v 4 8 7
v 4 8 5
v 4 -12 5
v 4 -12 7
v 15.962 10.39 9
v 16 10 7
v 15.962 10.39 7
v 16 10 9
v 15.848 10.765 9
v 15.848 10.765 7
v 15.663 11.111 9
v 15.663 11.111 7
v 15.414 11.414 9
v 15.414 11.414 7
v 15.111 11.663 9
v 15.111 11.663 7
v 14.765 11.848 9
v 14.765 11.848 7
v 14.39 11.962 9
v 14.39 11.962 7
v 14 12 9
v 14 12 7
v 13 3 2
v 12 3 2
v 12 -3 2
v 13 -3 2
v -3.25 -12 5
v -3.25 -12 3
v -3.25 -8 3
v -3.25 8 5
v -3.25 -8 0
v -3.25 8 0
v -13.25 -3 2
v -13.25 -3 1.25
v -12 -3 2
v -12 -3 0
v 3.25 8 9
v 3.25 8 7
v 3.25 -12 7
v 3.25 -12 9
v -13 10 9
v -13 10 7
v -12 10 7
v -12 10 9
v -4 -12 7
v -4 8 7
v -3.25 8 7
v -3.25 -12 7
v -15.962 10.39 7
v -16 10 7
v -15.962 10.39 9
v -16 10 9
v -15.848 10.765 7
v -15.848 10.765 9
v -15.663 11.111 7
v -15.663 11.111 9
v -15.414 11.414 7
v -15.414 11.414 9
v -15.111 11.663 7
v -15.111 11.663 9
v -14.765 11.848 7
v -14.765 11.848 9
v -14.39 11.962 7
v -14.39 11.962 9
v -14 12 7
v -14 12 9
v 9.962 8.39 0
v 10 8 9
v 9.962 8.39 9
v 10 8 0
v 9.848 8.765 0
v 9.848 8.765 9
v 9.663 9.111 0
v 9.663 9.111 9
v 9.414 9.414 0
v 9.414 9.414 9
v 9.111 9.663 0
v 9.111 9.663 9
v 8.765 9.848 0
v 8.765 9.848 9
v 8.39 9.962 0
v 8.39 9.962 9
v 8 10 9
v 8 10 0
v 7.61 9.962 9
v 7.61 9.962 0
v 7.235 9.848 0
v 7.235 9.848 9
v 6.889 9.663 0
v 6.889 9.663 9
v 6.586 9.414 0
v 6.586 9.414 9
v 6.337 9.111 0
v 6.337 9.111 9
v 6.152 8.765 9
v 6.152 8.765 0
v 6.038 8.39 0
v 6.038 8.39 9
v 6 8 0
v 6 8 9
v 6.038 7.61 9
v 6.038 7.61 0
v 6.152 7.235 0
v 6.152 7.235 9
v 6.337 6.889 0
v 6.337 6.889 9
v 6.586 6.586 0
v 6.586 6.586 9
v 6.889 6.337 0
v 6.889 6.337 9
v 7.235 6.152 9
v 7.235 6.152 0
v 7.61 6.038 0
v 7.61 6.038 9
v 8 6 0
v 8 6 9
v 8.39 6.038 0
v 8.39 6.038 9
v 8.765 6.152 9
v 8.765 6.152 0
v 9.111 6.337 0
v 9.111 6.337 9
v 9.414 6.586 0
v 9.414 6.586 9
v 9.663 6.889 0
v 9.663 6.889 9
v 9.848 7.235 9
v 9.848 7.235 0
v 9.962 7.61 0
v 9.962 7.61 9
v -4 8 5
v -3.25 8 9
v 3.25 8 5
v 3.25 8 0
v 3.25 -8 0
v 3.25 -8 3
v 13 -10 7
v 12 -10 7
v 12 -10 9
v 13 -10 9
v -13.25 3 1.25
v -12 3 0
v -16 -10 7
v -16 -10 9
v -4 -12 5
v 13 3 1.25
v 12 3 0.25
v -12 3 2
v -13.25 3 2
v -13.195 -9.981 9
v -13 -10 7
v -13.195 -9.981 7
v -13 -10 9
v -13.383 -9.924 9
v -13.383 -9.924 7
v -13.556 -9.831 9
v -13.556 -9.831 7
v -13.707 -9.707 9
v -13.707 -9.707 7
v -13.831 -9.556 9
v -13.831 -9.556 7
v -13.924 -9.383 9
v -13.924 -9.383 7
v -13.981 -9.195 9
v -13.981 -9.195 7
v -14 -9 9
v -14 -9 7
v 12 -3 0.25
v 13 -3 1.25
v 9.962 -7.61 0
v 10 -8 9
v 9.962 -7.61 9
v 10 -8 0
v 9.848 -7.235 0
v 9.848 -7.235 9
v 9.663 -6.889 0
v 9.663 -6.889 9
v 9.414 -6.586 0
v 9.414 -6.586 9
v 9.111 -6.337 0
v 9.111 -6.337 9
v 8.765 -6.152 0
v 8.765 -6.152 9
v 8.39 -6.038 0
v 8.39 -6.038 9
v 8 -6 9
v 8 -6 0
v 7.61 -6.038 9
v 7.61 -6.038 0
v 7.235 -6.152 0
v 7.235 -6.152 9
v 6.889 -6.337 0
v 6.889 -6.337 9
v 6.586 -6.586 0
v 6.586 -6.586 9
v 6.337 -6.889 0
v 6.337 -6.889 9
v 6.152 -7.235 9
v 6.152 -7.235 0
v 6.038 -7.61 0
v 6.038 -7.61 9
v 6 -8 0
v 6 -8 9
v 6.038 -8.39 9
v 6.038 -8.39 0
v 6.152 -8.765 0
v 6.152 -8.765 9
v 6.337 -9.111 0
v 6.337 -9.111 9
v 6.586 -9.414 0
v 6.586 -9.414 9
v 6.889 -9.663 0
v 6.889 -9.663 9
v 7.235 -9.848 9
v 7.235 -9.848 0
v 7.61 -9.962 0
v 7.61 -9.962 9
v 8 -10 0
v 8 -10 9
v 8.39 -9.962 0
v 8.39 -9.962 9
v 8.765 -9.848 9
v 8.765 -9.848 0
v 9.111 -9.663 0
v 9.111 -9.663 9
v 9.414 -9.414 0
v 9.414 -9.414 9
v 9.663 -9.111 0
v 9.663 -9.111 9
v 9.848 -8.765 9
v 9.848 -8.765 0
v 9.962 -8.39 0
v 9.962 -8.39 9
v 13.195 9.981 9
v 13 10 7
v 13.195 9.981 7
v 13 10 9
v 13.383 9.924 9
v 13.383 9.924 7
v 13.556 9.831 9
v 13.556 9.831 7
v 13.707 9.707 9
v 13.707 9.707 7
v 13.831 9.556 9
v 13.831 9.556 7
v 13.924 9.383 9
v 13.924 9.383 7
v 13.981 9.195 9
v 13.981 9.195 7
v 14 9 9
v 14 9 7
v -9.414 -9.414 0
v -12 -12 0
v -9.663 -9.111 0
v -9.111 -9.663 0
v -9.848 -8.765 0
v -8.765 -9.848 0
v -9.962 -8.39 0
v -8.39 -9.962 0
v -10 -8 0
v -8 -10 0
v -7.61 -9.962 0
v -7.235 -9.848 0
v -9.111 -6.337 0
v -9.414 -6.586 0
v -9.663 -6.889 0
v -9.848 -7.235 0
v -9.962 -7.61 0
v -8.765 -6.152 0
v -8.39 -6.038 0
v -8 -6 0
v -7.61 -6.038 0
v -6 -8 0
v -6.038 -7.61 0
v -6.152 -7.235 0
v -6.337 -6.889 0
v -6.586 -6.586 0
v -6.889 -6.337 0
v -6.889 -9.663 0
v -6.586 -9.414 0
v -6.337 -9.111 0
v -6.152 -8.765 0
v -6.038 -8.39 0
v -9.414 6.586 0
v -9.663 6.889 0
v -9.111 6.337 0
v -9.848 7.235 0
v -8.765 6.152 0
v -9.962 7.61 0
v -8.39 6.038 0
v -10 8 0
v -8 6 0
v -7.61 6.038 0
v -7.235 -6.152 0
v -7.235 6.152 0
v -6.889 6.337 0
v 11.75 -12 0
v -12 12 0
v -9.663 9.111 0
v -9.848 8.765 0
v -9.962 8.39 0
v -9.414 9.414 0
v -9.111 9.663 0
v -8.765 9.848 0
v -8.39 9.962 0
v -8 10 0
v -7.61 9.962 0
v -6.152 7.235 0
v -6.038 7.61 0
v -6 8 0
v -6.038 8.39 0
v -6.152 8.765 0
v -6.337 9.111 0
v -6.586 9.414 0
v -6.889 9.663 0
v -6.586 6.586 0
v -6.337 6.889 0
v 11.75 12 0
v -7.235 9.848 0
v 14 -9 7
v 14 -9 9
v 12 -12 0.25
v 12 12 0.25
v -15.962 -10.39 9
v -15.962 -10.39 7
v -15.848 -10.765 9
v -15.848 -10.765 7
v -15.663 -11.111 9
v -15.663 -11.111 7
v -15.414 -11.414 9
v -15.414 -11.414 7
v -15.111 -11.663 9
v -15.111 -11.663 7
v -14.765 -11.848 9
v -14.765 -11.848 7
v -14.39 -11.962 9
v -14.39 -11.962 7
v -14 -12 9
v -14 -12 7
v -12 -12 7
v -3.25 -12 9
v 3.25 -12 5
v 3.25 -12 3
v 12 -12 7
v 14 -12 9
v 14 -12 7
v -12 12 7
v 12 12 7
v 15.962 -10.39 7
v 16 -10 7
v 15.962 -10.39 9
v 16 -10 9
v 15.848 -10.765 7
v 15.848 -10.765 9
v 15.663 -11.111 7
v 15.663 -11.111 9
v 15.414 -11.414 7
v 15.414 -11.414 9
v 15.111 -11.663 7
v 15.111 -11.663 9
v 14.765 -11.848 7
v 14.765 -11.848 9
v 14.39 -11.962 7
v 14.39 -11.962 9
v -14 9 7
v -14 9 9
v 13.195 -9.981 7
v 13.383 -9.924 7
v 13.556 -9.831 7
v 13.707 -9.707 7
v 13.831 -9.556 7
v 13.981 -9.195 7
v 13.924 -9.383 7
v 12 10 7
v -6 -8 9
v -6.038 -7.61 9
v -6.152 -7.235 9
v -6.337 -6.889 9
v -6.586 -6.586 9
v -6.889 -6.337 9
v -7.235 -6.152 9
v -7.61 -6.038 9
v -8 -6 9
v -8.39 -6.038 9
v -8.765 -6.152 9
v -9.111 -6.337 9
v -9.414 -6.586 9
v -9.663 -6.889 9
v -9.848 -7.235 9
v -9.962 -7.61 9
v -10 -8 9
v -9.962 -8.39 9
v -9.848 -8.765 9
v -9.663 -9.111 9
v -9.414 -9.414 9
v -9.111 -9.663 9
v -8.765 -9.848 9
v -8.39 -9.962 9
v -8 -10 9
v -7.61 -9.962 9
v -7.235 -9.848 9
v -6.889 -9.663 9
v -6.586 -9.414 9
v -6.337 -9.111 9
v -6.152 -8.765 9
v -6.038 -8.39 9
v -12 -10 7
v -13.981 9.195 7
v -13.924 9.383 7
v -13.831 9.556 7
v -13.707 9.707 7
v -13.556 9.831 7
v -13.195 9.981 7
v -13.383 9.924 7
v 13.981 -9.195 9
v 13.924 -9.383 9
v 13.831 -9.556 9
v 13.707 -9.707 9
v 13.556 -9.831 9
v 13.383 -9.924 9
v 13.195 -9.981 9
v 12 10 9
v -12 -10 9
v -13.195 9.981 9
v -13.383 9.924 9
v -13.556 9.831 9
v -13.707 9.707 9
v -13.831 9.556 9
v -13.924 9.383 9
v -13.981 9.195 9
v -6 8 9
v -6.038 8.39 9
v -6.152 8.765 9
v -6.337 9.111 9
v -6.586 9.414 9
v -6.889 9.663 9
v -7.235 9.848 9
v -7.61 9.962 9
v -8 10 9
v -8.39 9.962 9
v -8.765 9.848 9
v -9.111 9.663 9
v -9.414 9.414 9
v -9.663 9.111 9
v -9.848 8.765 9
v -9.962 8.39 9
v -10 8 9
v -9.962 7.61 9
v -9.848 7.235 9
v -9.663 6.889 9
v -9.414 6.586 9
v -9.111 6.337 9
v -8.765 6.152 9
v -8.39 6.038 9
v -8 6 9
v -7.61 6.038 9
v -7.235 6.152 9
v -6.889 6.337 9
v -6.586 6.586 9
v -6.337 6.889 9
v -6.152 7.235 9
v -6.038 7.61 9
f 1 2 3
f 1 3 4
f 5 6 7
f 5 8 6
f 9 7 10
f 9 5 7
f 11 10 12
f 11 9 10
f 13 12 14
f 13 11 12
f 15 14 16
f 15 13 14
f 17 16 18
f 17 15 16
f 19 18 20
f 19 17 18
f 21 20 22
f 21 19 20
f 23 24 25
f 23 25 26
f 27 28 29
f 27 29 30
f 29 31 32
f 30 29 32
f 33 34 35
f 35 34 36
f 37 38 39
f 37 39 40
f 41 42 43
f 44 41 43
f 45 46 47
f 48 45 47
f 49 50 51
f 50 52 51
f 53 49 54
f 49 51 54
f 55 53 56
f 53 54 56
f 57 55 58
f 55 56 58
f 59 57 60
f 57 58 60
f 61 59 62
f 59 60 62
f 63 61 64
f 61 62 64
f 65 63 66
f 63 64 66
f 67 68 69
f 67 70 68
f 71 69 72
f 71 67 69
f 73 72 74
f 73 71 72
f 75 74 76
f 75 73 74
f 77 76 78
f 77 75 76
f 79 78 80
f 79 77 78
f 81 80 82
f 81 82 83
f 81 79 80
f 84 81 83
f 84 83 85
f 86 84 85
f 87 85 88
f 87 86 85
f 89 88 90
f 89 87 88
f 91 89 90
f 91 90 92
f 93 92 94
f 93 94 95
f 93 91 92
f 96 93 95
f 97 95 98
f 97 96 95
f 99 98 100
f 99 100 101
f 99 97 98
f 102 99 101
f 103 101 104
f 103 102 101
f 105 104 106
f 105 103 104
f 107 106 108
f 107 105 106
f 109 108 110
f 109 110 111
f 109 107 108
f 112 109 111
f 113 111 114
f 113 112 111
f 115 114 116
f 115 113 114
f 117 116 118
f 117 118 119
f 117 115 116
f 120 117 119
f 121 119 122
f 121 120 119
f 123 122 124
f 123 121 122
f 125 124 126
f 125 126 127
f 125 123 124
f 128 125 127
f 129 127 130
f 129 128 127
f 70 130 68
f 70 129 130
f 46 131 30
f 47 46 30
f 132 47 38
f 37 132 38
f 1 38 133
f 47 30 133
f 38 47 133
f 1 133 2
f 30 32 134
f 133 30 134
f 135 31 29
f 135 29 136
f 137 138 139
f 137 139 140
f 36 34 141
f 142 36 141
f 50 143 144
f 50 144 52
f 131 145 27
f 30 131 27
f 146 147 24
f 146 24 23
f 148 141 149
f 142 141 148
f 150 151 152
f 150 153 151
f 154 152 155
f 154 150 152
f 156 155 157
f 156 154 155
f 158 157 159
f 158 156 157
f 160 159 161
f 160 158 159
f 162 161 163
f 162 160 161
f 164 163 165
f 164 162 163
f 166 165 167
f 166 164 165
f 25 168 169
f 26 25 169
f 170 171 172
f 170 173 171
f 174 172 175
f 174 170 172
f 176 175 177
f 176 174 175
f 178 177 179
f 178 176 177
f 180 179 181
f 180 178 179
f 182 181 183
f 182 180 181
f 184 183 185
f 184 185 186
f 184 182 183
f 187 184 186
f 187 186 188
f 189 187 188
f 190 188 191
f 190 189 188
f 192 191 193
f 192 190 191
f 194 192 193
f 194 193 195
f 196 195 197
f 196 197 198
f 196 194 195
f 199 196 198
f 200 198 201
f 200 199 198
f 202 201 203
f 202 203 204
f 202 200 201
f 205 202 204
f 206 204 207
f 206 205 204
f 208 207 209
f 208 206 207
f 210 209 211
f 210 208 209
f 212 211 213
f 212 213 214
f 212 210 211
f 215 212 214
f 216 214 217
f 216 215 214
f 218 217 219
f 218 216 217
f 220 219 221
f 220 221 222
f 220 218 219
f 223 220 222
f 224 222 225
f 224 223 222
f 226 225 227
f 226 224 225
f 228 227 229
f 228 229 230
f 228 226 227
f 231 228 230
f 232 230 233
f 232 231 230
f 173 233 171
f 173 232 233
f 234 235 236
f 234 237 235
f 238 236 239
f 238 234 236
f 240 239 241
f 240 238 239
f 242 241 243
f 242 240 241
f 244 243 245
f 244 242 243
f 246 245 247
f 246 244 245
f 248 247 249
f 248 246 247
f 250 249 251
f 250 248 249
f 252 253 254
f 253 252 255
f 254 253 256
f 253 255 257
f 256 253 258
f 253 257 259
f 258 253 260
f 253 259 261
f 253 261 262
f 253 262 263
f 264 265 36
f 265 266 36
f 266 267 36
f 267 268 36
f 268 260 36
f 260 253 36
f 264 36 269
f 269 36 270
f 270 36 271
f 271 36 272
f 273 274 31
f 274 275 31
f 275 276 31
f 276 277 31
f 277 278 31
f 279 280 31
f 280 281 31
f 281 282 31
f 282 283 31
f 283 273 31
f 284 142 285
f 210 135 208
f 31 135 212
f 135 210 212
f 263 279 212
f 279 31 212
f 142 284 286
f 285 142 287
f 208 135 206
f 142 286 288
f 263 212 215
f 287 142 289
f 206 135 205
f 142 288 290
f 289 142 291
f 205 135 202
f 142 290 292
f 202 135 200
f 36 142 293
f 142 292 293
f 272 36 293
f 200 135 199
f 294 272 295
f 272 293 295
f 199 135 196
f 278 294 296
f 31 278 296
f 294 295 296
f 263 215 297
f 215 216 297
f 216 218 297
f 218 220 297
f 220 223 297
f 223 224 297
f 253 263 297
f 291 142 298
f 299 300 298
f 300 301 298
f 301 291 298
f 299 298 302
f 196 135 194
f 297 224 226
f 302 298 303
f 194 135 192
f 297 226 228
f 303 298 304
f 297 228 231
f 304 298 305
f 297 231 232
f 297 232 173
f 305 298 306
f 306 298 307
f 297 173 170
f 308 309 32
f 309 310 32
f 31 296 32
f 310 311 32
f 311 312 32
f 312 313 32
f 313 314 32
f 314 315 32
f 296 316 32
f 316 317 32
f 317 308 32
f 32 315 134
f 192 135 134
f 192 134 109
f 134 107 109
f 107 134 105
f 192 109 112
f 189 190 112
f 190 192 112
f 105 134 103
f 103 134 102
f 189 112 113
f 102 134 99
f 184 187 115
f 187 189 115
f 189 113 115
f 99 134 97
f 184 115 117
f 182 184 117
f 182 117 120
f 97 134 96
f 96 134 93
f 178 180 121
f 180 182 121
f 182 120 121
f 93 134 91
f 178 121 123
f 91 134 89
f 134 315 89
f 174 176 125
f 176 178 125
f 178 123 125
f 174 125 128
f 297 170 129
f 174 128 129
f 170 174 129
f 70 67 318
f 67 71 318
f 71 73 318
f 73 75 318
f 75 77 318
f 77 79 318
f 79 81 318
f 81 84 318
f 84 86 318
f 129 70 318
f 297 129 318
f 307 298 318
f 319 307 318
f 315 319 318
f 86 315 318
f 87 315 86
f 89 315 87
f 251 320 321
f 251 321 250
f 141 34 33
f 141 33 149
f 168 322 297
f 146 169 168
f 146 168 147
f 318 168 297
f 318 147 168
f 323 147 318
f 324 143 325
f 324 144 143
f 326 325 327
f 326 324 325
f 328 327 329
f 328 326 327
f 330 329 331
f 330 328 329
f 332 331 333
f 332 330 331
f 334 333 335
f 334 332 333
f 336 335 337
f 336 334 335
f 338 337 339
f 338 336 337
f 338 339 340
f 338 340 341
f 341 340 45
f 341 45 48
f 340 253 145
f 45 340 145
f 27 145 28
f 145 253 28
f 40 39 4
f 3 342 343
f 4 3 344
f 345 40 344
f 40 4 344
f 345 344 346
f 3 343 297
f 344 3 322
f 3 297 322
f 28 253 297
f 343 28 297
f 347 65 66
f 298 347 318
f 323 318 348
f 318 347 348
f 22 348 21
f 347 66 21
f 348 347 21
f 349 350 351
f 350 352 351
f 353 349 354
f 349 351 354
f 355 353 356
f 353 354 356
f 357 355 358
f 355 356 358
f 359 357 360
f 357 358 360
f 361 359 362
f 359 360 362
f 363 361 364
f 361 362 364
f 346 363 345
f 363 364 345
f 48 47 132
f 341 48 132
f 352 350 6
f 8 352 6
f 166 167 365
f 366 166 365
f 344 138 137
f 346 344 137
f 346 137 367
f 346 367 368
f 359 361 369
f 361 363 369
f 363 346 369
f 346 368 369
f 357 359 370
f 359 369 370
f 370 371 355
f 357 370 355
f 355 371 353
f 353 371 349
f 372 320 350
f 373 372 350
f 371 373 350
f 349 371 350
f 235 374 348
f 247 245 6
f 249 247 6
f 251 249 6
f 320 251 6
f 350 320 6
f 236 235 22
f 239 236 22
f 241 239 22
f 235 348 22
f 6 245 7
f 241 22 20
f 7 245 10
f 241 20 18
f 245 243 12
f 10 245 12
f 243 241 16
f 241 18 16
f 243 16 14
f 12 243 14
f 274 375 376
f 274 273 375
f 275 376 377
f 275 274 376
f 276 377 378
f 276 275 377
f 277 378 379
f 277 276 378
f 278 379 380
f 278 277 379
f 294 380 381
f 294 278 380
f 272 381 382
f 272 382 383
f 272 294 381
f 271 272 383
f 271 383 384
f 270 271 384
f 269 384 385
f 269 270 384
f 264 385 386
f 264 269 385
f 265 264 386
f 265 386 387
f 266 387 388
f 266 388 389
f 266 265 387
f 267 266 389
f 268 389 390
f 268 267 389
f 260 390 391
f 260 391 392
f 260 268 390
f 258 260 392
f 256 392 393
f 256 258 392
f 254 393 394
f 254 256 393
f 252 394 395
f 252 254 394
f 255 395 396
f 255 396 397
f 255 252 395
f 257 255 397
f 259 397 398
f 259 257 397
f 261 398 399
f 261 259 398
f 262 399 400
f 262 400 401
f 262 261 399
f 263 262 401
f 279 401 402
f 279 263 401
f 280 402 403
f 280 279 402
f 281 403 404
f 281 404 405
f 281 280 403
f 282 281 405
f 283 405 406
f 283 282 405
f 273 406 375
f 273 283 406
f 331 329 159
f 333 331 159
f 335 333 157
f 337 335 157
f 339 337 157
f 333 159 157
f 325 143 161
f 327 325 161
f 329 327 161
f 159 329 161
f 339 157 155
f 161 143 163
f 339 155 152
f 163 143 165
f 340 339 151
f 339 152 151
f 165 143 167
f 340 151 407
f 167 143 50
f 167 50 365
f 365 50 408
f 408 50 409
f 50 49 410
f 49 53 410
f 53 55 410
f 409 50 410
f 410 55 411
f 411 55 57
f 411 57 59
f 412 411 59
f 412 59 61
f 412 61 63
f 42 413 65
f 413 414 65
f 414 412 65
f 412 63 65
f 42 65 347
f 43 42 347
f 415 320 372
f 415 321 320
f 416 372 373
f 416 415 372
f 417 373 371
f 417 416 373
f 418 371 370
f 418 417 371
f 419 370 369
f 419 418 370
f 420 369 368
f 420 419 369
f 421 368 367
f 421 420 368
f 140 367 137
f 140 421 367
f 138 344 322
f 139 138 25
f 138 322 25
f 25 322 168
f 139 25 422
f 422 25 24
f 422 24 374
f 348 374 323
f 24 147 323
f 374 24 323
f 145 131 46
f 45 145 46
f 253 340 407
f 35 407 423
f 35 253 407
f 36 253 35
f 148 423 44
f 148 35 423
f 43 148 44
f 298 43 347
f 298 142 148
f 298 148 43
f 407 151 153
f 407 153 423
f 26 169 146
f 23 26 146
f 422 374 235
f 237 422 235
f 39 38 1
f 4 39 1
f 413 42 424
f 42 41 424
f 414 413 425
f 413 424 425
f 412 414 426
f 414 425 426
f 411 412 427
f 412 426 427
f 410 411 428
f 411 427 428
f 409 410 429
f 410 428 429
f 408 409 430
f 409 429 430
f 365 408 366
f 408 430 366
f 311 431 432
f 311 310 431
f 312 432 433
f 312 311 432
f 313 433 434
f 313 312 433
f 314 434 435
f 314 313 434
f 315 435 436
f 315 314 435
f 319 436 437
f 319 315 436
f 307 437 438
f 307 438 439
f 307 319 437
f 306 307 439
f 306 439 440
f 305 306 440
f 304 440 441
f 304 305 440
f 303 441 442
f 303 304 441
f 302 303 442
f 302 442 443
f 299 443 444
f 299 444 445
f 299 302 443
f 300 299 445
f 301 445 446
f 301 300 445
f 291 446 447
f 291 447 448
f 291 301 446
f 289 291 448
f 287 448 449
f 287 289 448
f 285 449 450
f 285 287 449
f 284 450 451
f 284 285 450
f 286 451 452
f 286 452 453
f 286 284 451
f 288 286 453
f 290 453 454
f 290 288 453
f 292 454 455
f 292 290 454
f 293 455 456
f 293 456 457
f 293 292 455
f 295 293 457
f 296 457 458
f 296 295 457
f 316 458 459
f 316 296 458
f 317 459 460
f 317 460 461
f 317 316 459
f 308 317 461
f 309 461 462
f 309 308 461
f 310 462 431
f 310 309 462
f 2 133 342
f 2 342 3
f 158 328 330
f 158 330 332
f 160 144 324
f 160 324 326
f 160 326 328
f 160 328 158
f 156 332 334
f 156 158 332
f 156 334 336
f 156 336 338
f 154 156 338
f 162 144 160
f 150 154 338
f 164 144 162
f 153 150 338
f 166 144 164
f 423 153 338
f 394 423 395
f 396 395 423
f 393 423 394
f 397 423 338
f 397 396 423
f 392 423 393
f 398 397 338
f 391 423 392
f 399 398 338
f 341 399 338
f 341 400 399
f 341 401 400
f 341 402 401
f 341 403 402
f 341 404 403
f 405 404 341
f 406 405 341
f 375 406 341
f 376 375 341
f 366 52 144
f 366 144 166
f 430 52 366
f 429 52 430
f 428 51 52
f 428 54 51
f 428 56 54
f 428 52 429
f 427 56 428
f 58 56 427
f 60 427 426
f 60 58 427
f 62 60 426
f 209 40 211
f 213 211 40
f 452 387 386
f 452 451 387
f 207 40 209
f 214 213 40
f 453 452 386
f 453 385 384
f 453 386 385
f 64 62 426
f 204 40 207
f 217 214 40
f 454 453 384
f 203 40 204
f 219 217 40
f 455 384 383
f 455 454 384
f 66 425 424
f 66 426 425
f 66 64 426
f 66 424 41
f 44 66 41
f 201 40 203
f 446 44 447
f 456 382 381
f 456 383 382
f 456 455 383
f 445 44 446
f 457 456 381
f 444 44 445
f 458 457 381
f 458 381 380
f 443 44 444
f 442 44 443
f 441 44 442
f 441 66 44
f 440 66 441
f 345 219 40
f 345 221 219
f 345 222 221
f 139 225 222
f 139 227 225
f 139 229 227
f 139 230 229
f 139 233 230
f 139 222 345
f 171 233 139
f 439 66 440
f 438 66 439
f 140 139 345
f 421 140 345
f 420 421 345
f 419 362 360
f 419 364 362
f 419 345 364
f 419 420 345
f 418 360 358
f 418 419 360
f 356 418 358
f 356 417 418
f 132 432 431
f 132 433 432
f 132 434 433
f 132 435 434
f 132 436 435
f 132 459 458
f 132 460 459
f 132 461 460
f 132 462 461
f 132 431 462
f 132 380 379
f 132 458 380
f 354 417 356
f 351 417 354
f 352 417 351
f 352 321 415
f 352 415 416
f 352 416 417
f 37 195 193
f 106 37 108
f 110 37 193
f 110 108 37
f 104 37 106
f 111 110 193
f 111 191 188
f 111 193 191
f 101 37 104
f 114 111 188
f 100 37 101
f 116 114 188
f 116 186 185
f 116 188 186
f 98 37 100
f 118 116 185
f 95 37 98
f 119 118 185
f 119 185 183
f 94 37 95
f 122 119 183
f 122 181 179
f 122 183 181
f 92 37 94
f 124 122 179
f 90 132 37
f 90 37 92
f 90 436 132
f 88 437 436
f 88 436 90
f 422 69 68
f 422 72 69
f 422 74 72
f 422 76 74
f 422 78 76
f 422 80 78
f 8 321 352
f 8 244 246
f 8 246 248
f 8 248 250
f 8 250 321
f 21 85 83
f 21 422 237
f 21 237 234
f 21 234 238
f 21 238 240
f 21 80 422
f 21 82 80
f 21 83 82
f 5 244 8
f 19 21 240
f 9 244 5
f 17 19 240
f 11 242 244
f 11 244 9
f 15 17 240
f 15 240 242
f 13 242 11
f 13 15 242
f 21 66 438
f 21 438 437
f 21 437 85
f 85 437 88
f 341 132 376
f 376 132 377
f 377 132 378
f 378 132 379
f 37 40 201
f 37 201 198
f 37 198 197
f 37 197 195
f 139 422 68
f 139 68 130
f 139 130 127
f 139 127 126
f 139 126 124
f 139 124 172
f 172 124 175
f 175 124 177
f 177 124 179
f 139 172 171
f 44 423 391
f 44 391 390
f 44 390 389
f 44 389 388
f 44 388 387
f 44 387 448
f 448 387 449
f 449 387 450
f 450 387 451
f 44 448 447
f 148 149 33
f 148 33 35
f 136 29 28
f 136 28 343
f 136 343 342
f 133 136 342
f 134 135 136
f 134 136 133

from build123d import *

# Parameters (mm, degrees)
F0_W      = 24
F0_H      = 24
F0_R      = 2
F1_DEPTH  = 9
F3_START  = 7
F2_W      = 32
F2_H      = 24
F2_R      = 2
F2_W_2    = 2
F2_H_2    = 20
F3_DEPTH  = 2
F4_W      = 8
F4_H      = 6
F5_DEPTH  = 12
F6_DEPTH  = 8
F7_W      = 0.75
F7_H      = 2
F8_DEPTH  = 12
F9_W      = 1.25
F9_H      = 6
F10_DEPTH = 2
F11_SIZE  = 1.25
F12_W     = 6.5
F12_H     = 16
F13_DEPTH = 3
F14_R     = 2
F15_R     = 1


with BuildPart() as f1:
    # F0 (on Top) → F1 (new body)
    with BuildSketch(Plane.XY):
        Rectangle(F0_W, F0_H)
        with Locations((-8, -8)):
            Circle(F0_R, mode=Mode.SUBTRACT)
        with Locations((8, -8)):
            Circle(F0_R, mode=Mode.SUBTRACT)
        with Locations((-8, 8)):
            Circle(F0_R, mode=Mode.SUBTRACT)
        with Locations((8, 8)):
            Circle(F0_R, mode=Mode.SUBTRACT)
    extrude(amount=F1_DEPTH)

    # F2 (on Top) → F3 (join)
    with BuildSketch(Plane.XY.offset(F3_START)):
        Rectangle(F2_W, F2_H)
        with Locations((-8, -8)):
            Circle(F2_R, mode=Mode.SUBTRACT)
        with Locations((8, -8)):
            Circle(F2_R, mode=Mode.SUBTRACT)
        with Locations((-13, 0)):
            Rectangle(F2_W_2, F2_H_2, mode=Mode.SUBTRACT)
        with Locations((-8, 8)):
            Circle(F2_R, mode=Mode.SUBTRACT)
        with Locations((13, 0)):
            Rectangle(F2_W_2, F2_H_2, mode=Mode.SUBTRACT)
        with Locations((8, 8)):
            Circle(F2_R, mode=Mode.SUBTRACT)
    extrude(amount=F3_DEPTH)

    # F4 (on Front) → F5 (cut)
    with BuildSketch(Plane.XZ):
        with Locations((0, 6)):
            Rectangle(F4_W, F4_H)
    extrude(amount=F5_DEPTH, mode=Mode.SUBTRACT)

    # F4 (on Front) → F6 (cut)
    with BuildSketch(Plane.XZ):
        with Locations((0, 6)):
            Rectangle(F4_W, F4_H)
    extrude(amount=-F6_DEPTH, mode=Mode.SUBTRACT)

    # F7 (on Front) → F8 (join, symmetric)
    with BuildSketch(Plane.XZ):
        with Locations((-3.625, 8)):
            Rectangle(F7_W, F7_H)
        with Locations((3.625, 8)):
            Rectangle(F7_W, F7_H)
        with Locations((3.625, 4)):
            Rectangle(F7_W, F7_H)
        with Locations((-3.625, 4)):
            Rectangle(F7_W, F7_H)
    extrude(amount=F8_DEPTH, both=True)

    # F9 (on Top) → F10 (join)
    with BuildSketch(Plane.XY):
        with Locations((-12.625, 0)):
            Rectangle(F9_W, F9_H)
        with Locations((12.375, 0)):
            Rectangle(F9_W, F9_H)
    extrude(amount=F10_DEPTH)

    # F11
    f11_edges = [f1.edges().sort_by_distance(p)[0] for p in [
        (13, 0, 0),
        (-13.25, 0, 0),
    ]]
    chamfer(f11_edges, length=F11_SIZE)

    # F12 (on Top) → F13 (cut)
    with BuildSketch(Plane.XY):
        Rectangle(F12_W, F12_H)
    extrude(amount=F13_DEPTH, mode=Mode.SUBTRACT)

    # F14
    f14_edges = [f1.edges().sort_by_distance(p)[0] for p in [
        (16, -12, 8),
        (16, 12, 8),
        (-16, -12, 8),
        (-16, 12, 8),
    ]]
    fillet(f14_edges, radius=F14_R)

    # F15
    f15_edges = [f1.edges().sort_by_distance(p)[0] for p in [
        (-14, 10, 8),
        (-14, -10, 8),
        (14, 10, 8),
        (14, -10, 8),
    ]]
    fillet(f15_edges, radius=F15_R)


solid = f1.part
